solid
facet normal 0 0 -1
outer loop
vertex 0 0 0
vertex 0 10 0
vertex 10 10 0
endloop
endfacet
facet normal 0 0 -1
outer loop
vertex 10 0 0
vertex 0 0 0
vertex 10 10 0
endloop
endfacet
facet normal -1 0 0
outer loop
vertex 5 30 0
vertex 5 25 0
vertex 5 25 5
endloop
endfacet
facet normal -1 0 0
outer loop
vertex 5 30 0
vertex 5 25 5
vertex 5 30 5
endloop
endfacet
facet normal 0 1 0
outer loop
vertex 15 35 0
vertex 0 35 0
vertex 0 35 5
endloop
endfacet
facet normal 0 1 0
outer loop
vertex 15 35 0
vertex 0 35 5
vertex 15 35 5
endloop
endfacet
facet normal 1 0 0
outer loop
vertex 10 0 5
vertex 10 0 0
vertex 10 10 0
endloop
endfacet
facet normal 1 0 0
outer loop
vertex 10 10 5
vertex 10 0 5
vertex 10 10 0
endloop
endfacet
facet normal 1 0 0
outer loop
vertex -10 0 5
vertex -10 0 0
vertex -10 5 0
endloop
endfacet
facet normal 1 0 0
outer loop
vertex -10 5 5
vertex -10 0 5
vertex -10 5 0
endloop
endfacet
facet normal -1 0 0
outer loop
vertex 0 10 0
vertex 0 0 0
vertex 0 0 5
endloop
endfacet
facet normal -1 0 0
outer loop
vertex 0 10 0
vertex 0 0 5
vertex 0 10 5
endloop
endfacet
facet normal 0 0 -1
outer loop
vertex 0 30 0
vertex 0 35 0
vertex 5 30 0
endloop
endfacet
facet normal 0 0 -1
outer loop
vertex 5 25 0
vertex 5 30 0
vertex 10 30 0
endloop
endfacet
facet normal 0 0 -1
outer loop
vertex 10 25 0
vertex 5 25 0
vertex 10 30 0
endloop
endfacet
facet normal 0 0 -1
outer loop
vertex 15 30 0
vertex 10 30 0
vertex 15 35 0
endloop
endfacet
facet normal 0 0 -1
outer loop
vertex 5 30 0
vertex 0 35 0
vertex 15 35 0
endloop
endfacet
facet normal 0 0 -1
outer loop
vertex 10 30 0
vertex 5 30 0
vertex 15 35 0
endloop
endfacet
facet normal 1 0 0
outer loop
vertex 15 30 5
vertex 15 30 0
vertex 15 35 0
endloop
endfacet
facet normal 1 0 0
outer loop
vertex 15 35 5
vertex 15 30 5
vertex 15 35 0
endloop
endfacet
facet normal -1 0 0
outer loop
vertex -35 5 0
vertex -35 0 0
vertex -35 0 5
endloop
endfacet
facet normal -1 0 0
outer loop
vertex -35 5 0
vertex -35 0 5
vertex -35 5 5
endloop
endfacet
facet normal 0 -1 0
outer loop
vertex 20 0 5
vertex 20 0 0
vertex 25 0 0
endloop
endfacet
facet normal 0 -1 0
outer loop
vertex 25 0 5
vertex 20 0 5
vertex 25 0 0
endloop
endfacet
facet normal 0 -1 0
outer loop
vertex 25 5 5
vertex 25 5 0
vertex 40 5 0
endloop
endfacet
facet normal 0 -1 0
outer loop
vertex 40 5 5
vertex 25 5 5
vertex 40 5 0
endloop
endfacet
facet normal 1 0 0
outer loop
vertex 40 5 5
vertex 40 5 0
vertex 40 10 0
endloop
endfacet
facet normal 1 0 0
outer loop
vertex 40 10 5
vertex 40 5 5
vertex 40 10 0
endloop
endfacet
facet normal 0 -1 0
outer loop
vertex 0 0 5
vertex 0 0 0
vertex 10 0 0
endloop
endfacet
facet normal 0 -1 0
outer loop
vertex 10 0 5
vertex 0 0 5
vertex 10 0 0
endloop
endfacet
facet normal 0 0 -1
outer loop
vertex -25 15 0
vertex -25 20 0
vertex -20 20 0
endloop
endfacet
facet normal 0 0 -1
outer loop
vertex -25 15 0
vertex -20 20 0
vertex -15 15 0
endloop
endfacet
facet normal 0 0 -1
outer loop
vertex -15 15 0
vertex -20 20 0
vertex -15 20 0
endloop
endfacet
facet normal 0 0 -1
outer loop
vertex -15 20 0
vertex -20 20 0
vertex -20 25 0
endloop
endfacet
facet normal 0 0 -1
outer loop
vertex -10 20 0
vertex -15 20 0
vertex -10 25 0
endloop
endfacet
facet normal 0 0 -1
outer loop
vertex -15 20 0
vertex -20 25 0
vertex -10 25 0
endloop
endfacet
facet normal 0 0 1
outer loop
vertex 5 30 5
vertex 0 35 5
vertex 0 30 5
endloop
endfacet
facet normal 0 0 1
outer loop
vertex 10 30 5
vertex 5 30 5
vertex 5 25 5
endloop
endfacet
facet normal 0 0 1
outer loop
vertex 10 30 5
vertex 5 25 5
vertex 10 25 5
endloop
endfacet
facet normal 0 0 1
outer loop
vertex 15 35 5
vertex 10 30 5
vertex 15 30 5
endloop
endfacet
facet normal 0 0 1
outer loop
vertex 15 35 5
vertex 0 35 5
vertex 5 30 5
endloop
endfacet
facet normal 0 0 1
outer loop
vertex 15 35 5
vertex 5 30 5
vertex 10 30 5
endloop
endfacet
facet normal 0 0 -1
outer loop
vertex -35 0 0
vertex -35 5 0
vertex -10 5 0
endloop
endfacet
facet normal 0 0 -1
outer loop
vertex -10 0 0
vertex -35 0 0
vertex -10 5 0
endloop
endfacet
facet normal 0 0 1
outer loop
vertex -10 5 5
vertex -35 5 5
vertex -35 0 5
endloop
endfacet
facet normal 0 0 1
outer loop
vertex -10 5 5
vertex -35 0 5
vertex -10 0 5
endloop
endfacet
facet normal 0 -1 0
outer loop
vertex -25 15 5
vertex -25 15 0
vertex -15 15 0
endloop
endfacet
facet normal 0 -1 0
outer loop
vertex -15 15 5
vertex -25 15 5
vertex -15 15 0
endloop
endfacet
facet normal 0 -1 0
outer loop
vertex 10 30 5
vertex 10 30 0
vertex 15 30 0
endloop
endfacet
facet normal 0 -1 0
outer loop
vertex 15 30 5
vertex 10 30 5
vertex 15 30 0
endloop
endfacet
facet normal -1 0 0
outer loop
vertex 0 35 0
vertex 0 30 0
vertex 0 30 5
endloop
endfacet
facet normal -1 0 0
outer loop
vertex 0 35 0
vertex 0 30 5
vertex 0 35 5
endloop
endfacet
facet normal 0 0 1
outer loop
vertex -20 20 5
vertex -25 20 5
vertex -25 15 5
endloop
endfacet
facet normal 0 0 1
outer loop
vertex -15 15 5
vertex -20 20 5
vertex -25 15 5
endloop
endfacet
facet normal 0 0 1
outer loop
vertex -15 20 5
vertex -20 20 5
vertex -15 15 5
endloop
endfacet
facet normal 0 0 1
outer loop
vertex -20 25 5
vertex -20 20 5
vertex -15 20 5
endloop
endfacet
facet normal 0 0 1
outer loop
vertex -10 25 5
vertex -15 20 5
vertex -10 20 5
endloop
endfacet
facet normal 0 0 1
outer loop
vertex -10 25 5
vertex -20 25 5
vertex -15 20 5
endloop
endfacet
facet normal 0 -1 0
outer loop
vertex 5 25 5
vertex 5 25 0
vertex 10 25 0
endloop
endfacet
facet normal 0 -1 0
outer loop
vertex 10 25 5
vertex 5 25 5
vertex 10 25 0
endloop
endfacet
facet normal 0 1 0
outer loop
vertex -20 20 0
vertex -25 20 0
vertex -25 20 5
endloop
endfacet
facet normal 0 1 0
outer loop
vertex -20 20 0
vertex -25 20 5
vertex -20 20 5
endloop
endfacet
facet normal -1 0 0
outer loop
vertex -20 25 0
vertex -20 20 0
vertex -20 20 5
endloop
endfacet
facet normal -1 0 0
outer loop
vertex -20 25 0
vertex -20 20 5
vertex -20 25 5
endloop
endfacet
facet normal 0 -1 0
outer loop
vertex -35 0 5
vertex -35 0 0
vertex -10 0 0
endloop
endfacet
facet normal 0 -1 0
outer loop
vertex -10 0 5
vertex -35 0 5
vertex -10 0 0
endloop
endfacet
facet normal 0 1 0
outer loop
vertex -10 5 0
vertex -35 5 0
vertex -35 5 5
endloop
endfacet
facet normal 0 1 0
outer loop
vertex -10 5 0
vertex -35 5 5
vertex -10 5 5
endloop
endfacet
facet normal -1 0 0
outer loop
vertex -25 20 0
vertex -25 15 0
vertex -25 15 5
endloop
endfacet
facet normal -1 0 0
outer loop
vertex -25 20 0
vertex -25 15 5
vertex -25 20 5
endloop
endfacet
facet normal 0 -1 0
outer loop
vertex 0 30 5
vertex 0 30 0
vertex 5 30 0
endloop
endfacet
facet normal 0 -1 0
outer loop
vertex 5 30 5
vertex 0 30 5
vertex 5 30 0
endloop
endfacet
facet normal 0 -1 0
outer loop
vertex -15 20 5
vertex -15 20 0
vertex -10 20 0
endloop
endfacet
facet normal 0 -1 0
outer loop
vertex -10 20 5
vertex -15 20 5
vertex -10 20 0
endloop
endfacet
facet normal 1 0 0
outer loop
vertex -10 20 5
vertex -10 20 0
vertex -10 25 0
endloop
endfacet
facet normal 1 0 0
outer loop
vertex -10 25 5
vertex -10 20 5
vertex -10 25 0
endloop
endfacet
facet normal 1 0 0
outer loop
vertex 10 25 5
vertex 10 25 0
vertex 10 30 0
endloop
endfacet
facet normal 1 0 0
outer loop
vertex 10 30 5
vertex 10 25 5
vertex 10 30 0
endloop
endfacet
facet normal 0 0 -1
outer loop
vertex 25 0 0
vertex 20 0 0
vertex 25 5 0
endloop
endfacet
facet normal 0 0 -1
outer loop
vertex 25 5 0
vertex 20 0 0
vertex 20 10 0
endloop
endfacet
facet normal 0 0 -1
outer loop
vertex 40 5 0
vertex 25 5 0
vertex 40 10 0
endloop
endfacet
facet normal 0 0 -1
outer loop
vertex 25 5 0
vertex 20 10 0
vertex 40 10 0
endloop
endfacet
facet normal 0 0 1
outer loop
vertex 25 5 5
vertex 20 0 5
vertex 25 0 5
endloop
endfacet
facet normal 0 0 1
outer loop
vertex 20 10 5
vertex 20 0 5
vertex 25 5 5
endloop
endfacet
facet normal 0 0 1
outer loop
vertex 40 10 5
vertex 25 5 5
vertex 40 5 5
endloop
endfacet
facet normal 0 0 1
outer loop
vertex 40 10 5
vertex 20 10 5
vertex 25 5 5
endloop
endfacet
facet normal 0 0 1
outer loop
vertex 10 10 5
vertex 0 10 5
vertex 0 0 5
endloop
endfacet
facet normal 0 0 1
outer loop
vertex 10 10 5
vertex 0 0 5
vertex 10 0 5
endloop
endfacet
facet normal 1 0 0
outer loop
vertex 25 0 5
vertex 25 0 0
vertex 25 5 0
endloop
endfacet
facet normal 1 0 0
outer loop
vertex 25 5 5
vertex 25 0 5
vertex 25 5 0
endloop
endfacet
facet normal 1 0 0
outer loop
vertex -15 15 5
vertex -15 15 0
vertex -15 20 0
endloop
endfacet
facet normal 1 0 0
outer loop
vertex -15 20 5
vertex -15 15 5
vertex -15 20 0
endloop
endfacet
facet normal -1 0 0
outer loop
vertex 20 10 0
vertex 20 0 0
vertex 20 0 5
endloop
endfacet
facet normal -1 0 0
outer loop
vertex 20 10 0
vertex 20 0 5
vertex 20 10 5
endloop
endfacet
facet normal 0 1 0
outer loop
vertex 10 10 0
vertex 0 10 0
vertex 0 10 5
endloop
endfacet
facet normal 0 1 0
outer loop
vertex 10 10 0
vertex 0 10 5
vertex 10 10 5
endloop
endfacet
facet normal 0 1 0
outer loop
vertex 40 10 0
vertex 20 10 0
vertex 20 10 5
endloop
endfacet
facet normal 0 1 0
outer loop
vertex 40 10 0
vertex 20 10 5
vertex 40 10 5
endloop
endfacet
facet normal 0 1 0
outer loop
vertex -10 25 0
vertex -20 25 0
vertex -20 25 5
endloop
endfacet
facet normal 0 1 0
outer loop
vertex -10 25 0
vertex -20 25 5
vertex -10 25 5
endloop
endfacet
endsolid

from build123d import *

# Parameters (mm, degrees)
BOX_W        = 10
BOX_H        = 10
BOX_DEPTH    = 5
BOX004_W     = 5
BOX004_H     = 5
BOX004_DEPTH = 5
BOX003_W     = 20
BOX003_H     = 5
BOX003_DEPTH = 5
BOX005_W     = 15
BOX005_H     = 5
BOX005_DEPTH = 5
BOX006_W     = 5
BOX006_H     = 5
BOX006_DEPTH = 5
BOX002_W     = 20
BOX002_H     = 5
BOX002_DEPTH = 5
BOX001_W     = 25
BOX001_H     = 5
BOX001_DEPTH = 5
BOX007_W     = 10
BOX007_H     = 5
BOX007_DEPTH = 5
BOX008_W     = 10
BOX008_H     = 5
BOX008_DEPTH = 5


with BuildPart() as cub:
    # Box → Box (new body)
    with BuildSketch(Plane.XY):
        with Locations((5, 5)):
            Rectangle(BOX_W, BOX_H)
    extrude(amount=BOX_DEPTH)


with BuildPart() as cub004:
    # Box004 → Box004 (new body)
    with BuildSketch(Plane(origin=(20, 0, 0), x_dir=(1, 0, 0), z_dir=(0, 0, 1))):
        with Locations((2.5, 2.5)):
            Rectangle(BOX004_W, BOX004_H)
    extrude(amount=BOX004_DEPTH)


with BuildPart() as fusion:
    # Box003 → Box003 (new body)
    with BuildSketch(Plane(origin=(20, 5, 0), x_dir=(1, 0, 0), z_dir=(0, 0, 1))):
        with Locations((10, 2.5)):
            Rectangle(BOX003_W, BOX003_H)
    extrude(amount=BOX003_DEPTH)

    # Fusion: union Cub004
    add(cub004.part)


with BuildPart() as cub005:
    # Box005 → Box005 (new body)
    with BuildSketch(Plane(origin=(0, 30, 0), x_dir=(1, 0, 0), z_dir=(0, 0, 1))):
        with Locations((7.5, 2.5)):
            Rectangle(BOX005_W, BOX005_H)
    extrude(amount=BOX005_DEPTH)


with BuildPart() as fusion001:
    # Box006 → Box006 (new body)
    with BuildSketch(Plane(origin=(5, 25, 0), x_dir=(1, 0, 0), z_dir=(0, 0, 1))):
        with Locations((2.5, 2.5)):
            Rectangle(BOX006_W, BOX006_H)
    extrude(amount=BOX006_DEPTH)

    # Fusion001: union Cub005
    add(cub005.part)


with BuildPart() as cub002:
    # Box002 → Box002 (new body)
    with BuildSketch(Plane(origin=(-35, 0, 0), x_dir=(1, 0, 0), z_dir=(0, 0, 1))):
        with Locations((10, 2.5)):
            Rectangle(BOX002_W, BOX002_H)
    extrude(amount=BOX002_DEPTH)


with BuildPart() as fusion002:
    # Box001 → Box001 (new body)
    with BuildSketch(Plane(origin=(-35, 0, 0), x_dir=(1, 0, 0), z_dir=(0, 0, 1))):
        with Locations((12.5, 2.5)):
            Rectangle(BOX001_W, BOX001_H)
    extrude(amount=BOX001_DEPTH)

    # Fusion002: union Cub002
    add(cub002.part)


with BuildPart() as cub007:
    # Box007 → Box007 (new body)
    with BuildSketch(Plane(origin=(-25, 15, 0), x_dir=(1, 0, 0), z_dir=(0, 0, 1))):
        with Locations((5, 2.5)):
            Rectangle(BOX007_W, BOX007_H)
    extrude(amount=BOX007_DEPTH)


with BuildPart() as fusion003:
    # Box008 → Box008 (new body)
    with BuildSketch(Plane(origin=(-20, 20, 0), x_dir=(1, 0, 0), z_dir=(0, 0, 1))):
        with Locations((5, 2.5)):
            Rectangle(BOX008_W, BOX008_H)
    extrude(amount=BOX008_DEPTH)

    # Fusion003: union Cub007
    add(cub007.part)


solid = Compound([cub.part, fusion.part, fusion001.part, fusion002.part, fusion003.part])
